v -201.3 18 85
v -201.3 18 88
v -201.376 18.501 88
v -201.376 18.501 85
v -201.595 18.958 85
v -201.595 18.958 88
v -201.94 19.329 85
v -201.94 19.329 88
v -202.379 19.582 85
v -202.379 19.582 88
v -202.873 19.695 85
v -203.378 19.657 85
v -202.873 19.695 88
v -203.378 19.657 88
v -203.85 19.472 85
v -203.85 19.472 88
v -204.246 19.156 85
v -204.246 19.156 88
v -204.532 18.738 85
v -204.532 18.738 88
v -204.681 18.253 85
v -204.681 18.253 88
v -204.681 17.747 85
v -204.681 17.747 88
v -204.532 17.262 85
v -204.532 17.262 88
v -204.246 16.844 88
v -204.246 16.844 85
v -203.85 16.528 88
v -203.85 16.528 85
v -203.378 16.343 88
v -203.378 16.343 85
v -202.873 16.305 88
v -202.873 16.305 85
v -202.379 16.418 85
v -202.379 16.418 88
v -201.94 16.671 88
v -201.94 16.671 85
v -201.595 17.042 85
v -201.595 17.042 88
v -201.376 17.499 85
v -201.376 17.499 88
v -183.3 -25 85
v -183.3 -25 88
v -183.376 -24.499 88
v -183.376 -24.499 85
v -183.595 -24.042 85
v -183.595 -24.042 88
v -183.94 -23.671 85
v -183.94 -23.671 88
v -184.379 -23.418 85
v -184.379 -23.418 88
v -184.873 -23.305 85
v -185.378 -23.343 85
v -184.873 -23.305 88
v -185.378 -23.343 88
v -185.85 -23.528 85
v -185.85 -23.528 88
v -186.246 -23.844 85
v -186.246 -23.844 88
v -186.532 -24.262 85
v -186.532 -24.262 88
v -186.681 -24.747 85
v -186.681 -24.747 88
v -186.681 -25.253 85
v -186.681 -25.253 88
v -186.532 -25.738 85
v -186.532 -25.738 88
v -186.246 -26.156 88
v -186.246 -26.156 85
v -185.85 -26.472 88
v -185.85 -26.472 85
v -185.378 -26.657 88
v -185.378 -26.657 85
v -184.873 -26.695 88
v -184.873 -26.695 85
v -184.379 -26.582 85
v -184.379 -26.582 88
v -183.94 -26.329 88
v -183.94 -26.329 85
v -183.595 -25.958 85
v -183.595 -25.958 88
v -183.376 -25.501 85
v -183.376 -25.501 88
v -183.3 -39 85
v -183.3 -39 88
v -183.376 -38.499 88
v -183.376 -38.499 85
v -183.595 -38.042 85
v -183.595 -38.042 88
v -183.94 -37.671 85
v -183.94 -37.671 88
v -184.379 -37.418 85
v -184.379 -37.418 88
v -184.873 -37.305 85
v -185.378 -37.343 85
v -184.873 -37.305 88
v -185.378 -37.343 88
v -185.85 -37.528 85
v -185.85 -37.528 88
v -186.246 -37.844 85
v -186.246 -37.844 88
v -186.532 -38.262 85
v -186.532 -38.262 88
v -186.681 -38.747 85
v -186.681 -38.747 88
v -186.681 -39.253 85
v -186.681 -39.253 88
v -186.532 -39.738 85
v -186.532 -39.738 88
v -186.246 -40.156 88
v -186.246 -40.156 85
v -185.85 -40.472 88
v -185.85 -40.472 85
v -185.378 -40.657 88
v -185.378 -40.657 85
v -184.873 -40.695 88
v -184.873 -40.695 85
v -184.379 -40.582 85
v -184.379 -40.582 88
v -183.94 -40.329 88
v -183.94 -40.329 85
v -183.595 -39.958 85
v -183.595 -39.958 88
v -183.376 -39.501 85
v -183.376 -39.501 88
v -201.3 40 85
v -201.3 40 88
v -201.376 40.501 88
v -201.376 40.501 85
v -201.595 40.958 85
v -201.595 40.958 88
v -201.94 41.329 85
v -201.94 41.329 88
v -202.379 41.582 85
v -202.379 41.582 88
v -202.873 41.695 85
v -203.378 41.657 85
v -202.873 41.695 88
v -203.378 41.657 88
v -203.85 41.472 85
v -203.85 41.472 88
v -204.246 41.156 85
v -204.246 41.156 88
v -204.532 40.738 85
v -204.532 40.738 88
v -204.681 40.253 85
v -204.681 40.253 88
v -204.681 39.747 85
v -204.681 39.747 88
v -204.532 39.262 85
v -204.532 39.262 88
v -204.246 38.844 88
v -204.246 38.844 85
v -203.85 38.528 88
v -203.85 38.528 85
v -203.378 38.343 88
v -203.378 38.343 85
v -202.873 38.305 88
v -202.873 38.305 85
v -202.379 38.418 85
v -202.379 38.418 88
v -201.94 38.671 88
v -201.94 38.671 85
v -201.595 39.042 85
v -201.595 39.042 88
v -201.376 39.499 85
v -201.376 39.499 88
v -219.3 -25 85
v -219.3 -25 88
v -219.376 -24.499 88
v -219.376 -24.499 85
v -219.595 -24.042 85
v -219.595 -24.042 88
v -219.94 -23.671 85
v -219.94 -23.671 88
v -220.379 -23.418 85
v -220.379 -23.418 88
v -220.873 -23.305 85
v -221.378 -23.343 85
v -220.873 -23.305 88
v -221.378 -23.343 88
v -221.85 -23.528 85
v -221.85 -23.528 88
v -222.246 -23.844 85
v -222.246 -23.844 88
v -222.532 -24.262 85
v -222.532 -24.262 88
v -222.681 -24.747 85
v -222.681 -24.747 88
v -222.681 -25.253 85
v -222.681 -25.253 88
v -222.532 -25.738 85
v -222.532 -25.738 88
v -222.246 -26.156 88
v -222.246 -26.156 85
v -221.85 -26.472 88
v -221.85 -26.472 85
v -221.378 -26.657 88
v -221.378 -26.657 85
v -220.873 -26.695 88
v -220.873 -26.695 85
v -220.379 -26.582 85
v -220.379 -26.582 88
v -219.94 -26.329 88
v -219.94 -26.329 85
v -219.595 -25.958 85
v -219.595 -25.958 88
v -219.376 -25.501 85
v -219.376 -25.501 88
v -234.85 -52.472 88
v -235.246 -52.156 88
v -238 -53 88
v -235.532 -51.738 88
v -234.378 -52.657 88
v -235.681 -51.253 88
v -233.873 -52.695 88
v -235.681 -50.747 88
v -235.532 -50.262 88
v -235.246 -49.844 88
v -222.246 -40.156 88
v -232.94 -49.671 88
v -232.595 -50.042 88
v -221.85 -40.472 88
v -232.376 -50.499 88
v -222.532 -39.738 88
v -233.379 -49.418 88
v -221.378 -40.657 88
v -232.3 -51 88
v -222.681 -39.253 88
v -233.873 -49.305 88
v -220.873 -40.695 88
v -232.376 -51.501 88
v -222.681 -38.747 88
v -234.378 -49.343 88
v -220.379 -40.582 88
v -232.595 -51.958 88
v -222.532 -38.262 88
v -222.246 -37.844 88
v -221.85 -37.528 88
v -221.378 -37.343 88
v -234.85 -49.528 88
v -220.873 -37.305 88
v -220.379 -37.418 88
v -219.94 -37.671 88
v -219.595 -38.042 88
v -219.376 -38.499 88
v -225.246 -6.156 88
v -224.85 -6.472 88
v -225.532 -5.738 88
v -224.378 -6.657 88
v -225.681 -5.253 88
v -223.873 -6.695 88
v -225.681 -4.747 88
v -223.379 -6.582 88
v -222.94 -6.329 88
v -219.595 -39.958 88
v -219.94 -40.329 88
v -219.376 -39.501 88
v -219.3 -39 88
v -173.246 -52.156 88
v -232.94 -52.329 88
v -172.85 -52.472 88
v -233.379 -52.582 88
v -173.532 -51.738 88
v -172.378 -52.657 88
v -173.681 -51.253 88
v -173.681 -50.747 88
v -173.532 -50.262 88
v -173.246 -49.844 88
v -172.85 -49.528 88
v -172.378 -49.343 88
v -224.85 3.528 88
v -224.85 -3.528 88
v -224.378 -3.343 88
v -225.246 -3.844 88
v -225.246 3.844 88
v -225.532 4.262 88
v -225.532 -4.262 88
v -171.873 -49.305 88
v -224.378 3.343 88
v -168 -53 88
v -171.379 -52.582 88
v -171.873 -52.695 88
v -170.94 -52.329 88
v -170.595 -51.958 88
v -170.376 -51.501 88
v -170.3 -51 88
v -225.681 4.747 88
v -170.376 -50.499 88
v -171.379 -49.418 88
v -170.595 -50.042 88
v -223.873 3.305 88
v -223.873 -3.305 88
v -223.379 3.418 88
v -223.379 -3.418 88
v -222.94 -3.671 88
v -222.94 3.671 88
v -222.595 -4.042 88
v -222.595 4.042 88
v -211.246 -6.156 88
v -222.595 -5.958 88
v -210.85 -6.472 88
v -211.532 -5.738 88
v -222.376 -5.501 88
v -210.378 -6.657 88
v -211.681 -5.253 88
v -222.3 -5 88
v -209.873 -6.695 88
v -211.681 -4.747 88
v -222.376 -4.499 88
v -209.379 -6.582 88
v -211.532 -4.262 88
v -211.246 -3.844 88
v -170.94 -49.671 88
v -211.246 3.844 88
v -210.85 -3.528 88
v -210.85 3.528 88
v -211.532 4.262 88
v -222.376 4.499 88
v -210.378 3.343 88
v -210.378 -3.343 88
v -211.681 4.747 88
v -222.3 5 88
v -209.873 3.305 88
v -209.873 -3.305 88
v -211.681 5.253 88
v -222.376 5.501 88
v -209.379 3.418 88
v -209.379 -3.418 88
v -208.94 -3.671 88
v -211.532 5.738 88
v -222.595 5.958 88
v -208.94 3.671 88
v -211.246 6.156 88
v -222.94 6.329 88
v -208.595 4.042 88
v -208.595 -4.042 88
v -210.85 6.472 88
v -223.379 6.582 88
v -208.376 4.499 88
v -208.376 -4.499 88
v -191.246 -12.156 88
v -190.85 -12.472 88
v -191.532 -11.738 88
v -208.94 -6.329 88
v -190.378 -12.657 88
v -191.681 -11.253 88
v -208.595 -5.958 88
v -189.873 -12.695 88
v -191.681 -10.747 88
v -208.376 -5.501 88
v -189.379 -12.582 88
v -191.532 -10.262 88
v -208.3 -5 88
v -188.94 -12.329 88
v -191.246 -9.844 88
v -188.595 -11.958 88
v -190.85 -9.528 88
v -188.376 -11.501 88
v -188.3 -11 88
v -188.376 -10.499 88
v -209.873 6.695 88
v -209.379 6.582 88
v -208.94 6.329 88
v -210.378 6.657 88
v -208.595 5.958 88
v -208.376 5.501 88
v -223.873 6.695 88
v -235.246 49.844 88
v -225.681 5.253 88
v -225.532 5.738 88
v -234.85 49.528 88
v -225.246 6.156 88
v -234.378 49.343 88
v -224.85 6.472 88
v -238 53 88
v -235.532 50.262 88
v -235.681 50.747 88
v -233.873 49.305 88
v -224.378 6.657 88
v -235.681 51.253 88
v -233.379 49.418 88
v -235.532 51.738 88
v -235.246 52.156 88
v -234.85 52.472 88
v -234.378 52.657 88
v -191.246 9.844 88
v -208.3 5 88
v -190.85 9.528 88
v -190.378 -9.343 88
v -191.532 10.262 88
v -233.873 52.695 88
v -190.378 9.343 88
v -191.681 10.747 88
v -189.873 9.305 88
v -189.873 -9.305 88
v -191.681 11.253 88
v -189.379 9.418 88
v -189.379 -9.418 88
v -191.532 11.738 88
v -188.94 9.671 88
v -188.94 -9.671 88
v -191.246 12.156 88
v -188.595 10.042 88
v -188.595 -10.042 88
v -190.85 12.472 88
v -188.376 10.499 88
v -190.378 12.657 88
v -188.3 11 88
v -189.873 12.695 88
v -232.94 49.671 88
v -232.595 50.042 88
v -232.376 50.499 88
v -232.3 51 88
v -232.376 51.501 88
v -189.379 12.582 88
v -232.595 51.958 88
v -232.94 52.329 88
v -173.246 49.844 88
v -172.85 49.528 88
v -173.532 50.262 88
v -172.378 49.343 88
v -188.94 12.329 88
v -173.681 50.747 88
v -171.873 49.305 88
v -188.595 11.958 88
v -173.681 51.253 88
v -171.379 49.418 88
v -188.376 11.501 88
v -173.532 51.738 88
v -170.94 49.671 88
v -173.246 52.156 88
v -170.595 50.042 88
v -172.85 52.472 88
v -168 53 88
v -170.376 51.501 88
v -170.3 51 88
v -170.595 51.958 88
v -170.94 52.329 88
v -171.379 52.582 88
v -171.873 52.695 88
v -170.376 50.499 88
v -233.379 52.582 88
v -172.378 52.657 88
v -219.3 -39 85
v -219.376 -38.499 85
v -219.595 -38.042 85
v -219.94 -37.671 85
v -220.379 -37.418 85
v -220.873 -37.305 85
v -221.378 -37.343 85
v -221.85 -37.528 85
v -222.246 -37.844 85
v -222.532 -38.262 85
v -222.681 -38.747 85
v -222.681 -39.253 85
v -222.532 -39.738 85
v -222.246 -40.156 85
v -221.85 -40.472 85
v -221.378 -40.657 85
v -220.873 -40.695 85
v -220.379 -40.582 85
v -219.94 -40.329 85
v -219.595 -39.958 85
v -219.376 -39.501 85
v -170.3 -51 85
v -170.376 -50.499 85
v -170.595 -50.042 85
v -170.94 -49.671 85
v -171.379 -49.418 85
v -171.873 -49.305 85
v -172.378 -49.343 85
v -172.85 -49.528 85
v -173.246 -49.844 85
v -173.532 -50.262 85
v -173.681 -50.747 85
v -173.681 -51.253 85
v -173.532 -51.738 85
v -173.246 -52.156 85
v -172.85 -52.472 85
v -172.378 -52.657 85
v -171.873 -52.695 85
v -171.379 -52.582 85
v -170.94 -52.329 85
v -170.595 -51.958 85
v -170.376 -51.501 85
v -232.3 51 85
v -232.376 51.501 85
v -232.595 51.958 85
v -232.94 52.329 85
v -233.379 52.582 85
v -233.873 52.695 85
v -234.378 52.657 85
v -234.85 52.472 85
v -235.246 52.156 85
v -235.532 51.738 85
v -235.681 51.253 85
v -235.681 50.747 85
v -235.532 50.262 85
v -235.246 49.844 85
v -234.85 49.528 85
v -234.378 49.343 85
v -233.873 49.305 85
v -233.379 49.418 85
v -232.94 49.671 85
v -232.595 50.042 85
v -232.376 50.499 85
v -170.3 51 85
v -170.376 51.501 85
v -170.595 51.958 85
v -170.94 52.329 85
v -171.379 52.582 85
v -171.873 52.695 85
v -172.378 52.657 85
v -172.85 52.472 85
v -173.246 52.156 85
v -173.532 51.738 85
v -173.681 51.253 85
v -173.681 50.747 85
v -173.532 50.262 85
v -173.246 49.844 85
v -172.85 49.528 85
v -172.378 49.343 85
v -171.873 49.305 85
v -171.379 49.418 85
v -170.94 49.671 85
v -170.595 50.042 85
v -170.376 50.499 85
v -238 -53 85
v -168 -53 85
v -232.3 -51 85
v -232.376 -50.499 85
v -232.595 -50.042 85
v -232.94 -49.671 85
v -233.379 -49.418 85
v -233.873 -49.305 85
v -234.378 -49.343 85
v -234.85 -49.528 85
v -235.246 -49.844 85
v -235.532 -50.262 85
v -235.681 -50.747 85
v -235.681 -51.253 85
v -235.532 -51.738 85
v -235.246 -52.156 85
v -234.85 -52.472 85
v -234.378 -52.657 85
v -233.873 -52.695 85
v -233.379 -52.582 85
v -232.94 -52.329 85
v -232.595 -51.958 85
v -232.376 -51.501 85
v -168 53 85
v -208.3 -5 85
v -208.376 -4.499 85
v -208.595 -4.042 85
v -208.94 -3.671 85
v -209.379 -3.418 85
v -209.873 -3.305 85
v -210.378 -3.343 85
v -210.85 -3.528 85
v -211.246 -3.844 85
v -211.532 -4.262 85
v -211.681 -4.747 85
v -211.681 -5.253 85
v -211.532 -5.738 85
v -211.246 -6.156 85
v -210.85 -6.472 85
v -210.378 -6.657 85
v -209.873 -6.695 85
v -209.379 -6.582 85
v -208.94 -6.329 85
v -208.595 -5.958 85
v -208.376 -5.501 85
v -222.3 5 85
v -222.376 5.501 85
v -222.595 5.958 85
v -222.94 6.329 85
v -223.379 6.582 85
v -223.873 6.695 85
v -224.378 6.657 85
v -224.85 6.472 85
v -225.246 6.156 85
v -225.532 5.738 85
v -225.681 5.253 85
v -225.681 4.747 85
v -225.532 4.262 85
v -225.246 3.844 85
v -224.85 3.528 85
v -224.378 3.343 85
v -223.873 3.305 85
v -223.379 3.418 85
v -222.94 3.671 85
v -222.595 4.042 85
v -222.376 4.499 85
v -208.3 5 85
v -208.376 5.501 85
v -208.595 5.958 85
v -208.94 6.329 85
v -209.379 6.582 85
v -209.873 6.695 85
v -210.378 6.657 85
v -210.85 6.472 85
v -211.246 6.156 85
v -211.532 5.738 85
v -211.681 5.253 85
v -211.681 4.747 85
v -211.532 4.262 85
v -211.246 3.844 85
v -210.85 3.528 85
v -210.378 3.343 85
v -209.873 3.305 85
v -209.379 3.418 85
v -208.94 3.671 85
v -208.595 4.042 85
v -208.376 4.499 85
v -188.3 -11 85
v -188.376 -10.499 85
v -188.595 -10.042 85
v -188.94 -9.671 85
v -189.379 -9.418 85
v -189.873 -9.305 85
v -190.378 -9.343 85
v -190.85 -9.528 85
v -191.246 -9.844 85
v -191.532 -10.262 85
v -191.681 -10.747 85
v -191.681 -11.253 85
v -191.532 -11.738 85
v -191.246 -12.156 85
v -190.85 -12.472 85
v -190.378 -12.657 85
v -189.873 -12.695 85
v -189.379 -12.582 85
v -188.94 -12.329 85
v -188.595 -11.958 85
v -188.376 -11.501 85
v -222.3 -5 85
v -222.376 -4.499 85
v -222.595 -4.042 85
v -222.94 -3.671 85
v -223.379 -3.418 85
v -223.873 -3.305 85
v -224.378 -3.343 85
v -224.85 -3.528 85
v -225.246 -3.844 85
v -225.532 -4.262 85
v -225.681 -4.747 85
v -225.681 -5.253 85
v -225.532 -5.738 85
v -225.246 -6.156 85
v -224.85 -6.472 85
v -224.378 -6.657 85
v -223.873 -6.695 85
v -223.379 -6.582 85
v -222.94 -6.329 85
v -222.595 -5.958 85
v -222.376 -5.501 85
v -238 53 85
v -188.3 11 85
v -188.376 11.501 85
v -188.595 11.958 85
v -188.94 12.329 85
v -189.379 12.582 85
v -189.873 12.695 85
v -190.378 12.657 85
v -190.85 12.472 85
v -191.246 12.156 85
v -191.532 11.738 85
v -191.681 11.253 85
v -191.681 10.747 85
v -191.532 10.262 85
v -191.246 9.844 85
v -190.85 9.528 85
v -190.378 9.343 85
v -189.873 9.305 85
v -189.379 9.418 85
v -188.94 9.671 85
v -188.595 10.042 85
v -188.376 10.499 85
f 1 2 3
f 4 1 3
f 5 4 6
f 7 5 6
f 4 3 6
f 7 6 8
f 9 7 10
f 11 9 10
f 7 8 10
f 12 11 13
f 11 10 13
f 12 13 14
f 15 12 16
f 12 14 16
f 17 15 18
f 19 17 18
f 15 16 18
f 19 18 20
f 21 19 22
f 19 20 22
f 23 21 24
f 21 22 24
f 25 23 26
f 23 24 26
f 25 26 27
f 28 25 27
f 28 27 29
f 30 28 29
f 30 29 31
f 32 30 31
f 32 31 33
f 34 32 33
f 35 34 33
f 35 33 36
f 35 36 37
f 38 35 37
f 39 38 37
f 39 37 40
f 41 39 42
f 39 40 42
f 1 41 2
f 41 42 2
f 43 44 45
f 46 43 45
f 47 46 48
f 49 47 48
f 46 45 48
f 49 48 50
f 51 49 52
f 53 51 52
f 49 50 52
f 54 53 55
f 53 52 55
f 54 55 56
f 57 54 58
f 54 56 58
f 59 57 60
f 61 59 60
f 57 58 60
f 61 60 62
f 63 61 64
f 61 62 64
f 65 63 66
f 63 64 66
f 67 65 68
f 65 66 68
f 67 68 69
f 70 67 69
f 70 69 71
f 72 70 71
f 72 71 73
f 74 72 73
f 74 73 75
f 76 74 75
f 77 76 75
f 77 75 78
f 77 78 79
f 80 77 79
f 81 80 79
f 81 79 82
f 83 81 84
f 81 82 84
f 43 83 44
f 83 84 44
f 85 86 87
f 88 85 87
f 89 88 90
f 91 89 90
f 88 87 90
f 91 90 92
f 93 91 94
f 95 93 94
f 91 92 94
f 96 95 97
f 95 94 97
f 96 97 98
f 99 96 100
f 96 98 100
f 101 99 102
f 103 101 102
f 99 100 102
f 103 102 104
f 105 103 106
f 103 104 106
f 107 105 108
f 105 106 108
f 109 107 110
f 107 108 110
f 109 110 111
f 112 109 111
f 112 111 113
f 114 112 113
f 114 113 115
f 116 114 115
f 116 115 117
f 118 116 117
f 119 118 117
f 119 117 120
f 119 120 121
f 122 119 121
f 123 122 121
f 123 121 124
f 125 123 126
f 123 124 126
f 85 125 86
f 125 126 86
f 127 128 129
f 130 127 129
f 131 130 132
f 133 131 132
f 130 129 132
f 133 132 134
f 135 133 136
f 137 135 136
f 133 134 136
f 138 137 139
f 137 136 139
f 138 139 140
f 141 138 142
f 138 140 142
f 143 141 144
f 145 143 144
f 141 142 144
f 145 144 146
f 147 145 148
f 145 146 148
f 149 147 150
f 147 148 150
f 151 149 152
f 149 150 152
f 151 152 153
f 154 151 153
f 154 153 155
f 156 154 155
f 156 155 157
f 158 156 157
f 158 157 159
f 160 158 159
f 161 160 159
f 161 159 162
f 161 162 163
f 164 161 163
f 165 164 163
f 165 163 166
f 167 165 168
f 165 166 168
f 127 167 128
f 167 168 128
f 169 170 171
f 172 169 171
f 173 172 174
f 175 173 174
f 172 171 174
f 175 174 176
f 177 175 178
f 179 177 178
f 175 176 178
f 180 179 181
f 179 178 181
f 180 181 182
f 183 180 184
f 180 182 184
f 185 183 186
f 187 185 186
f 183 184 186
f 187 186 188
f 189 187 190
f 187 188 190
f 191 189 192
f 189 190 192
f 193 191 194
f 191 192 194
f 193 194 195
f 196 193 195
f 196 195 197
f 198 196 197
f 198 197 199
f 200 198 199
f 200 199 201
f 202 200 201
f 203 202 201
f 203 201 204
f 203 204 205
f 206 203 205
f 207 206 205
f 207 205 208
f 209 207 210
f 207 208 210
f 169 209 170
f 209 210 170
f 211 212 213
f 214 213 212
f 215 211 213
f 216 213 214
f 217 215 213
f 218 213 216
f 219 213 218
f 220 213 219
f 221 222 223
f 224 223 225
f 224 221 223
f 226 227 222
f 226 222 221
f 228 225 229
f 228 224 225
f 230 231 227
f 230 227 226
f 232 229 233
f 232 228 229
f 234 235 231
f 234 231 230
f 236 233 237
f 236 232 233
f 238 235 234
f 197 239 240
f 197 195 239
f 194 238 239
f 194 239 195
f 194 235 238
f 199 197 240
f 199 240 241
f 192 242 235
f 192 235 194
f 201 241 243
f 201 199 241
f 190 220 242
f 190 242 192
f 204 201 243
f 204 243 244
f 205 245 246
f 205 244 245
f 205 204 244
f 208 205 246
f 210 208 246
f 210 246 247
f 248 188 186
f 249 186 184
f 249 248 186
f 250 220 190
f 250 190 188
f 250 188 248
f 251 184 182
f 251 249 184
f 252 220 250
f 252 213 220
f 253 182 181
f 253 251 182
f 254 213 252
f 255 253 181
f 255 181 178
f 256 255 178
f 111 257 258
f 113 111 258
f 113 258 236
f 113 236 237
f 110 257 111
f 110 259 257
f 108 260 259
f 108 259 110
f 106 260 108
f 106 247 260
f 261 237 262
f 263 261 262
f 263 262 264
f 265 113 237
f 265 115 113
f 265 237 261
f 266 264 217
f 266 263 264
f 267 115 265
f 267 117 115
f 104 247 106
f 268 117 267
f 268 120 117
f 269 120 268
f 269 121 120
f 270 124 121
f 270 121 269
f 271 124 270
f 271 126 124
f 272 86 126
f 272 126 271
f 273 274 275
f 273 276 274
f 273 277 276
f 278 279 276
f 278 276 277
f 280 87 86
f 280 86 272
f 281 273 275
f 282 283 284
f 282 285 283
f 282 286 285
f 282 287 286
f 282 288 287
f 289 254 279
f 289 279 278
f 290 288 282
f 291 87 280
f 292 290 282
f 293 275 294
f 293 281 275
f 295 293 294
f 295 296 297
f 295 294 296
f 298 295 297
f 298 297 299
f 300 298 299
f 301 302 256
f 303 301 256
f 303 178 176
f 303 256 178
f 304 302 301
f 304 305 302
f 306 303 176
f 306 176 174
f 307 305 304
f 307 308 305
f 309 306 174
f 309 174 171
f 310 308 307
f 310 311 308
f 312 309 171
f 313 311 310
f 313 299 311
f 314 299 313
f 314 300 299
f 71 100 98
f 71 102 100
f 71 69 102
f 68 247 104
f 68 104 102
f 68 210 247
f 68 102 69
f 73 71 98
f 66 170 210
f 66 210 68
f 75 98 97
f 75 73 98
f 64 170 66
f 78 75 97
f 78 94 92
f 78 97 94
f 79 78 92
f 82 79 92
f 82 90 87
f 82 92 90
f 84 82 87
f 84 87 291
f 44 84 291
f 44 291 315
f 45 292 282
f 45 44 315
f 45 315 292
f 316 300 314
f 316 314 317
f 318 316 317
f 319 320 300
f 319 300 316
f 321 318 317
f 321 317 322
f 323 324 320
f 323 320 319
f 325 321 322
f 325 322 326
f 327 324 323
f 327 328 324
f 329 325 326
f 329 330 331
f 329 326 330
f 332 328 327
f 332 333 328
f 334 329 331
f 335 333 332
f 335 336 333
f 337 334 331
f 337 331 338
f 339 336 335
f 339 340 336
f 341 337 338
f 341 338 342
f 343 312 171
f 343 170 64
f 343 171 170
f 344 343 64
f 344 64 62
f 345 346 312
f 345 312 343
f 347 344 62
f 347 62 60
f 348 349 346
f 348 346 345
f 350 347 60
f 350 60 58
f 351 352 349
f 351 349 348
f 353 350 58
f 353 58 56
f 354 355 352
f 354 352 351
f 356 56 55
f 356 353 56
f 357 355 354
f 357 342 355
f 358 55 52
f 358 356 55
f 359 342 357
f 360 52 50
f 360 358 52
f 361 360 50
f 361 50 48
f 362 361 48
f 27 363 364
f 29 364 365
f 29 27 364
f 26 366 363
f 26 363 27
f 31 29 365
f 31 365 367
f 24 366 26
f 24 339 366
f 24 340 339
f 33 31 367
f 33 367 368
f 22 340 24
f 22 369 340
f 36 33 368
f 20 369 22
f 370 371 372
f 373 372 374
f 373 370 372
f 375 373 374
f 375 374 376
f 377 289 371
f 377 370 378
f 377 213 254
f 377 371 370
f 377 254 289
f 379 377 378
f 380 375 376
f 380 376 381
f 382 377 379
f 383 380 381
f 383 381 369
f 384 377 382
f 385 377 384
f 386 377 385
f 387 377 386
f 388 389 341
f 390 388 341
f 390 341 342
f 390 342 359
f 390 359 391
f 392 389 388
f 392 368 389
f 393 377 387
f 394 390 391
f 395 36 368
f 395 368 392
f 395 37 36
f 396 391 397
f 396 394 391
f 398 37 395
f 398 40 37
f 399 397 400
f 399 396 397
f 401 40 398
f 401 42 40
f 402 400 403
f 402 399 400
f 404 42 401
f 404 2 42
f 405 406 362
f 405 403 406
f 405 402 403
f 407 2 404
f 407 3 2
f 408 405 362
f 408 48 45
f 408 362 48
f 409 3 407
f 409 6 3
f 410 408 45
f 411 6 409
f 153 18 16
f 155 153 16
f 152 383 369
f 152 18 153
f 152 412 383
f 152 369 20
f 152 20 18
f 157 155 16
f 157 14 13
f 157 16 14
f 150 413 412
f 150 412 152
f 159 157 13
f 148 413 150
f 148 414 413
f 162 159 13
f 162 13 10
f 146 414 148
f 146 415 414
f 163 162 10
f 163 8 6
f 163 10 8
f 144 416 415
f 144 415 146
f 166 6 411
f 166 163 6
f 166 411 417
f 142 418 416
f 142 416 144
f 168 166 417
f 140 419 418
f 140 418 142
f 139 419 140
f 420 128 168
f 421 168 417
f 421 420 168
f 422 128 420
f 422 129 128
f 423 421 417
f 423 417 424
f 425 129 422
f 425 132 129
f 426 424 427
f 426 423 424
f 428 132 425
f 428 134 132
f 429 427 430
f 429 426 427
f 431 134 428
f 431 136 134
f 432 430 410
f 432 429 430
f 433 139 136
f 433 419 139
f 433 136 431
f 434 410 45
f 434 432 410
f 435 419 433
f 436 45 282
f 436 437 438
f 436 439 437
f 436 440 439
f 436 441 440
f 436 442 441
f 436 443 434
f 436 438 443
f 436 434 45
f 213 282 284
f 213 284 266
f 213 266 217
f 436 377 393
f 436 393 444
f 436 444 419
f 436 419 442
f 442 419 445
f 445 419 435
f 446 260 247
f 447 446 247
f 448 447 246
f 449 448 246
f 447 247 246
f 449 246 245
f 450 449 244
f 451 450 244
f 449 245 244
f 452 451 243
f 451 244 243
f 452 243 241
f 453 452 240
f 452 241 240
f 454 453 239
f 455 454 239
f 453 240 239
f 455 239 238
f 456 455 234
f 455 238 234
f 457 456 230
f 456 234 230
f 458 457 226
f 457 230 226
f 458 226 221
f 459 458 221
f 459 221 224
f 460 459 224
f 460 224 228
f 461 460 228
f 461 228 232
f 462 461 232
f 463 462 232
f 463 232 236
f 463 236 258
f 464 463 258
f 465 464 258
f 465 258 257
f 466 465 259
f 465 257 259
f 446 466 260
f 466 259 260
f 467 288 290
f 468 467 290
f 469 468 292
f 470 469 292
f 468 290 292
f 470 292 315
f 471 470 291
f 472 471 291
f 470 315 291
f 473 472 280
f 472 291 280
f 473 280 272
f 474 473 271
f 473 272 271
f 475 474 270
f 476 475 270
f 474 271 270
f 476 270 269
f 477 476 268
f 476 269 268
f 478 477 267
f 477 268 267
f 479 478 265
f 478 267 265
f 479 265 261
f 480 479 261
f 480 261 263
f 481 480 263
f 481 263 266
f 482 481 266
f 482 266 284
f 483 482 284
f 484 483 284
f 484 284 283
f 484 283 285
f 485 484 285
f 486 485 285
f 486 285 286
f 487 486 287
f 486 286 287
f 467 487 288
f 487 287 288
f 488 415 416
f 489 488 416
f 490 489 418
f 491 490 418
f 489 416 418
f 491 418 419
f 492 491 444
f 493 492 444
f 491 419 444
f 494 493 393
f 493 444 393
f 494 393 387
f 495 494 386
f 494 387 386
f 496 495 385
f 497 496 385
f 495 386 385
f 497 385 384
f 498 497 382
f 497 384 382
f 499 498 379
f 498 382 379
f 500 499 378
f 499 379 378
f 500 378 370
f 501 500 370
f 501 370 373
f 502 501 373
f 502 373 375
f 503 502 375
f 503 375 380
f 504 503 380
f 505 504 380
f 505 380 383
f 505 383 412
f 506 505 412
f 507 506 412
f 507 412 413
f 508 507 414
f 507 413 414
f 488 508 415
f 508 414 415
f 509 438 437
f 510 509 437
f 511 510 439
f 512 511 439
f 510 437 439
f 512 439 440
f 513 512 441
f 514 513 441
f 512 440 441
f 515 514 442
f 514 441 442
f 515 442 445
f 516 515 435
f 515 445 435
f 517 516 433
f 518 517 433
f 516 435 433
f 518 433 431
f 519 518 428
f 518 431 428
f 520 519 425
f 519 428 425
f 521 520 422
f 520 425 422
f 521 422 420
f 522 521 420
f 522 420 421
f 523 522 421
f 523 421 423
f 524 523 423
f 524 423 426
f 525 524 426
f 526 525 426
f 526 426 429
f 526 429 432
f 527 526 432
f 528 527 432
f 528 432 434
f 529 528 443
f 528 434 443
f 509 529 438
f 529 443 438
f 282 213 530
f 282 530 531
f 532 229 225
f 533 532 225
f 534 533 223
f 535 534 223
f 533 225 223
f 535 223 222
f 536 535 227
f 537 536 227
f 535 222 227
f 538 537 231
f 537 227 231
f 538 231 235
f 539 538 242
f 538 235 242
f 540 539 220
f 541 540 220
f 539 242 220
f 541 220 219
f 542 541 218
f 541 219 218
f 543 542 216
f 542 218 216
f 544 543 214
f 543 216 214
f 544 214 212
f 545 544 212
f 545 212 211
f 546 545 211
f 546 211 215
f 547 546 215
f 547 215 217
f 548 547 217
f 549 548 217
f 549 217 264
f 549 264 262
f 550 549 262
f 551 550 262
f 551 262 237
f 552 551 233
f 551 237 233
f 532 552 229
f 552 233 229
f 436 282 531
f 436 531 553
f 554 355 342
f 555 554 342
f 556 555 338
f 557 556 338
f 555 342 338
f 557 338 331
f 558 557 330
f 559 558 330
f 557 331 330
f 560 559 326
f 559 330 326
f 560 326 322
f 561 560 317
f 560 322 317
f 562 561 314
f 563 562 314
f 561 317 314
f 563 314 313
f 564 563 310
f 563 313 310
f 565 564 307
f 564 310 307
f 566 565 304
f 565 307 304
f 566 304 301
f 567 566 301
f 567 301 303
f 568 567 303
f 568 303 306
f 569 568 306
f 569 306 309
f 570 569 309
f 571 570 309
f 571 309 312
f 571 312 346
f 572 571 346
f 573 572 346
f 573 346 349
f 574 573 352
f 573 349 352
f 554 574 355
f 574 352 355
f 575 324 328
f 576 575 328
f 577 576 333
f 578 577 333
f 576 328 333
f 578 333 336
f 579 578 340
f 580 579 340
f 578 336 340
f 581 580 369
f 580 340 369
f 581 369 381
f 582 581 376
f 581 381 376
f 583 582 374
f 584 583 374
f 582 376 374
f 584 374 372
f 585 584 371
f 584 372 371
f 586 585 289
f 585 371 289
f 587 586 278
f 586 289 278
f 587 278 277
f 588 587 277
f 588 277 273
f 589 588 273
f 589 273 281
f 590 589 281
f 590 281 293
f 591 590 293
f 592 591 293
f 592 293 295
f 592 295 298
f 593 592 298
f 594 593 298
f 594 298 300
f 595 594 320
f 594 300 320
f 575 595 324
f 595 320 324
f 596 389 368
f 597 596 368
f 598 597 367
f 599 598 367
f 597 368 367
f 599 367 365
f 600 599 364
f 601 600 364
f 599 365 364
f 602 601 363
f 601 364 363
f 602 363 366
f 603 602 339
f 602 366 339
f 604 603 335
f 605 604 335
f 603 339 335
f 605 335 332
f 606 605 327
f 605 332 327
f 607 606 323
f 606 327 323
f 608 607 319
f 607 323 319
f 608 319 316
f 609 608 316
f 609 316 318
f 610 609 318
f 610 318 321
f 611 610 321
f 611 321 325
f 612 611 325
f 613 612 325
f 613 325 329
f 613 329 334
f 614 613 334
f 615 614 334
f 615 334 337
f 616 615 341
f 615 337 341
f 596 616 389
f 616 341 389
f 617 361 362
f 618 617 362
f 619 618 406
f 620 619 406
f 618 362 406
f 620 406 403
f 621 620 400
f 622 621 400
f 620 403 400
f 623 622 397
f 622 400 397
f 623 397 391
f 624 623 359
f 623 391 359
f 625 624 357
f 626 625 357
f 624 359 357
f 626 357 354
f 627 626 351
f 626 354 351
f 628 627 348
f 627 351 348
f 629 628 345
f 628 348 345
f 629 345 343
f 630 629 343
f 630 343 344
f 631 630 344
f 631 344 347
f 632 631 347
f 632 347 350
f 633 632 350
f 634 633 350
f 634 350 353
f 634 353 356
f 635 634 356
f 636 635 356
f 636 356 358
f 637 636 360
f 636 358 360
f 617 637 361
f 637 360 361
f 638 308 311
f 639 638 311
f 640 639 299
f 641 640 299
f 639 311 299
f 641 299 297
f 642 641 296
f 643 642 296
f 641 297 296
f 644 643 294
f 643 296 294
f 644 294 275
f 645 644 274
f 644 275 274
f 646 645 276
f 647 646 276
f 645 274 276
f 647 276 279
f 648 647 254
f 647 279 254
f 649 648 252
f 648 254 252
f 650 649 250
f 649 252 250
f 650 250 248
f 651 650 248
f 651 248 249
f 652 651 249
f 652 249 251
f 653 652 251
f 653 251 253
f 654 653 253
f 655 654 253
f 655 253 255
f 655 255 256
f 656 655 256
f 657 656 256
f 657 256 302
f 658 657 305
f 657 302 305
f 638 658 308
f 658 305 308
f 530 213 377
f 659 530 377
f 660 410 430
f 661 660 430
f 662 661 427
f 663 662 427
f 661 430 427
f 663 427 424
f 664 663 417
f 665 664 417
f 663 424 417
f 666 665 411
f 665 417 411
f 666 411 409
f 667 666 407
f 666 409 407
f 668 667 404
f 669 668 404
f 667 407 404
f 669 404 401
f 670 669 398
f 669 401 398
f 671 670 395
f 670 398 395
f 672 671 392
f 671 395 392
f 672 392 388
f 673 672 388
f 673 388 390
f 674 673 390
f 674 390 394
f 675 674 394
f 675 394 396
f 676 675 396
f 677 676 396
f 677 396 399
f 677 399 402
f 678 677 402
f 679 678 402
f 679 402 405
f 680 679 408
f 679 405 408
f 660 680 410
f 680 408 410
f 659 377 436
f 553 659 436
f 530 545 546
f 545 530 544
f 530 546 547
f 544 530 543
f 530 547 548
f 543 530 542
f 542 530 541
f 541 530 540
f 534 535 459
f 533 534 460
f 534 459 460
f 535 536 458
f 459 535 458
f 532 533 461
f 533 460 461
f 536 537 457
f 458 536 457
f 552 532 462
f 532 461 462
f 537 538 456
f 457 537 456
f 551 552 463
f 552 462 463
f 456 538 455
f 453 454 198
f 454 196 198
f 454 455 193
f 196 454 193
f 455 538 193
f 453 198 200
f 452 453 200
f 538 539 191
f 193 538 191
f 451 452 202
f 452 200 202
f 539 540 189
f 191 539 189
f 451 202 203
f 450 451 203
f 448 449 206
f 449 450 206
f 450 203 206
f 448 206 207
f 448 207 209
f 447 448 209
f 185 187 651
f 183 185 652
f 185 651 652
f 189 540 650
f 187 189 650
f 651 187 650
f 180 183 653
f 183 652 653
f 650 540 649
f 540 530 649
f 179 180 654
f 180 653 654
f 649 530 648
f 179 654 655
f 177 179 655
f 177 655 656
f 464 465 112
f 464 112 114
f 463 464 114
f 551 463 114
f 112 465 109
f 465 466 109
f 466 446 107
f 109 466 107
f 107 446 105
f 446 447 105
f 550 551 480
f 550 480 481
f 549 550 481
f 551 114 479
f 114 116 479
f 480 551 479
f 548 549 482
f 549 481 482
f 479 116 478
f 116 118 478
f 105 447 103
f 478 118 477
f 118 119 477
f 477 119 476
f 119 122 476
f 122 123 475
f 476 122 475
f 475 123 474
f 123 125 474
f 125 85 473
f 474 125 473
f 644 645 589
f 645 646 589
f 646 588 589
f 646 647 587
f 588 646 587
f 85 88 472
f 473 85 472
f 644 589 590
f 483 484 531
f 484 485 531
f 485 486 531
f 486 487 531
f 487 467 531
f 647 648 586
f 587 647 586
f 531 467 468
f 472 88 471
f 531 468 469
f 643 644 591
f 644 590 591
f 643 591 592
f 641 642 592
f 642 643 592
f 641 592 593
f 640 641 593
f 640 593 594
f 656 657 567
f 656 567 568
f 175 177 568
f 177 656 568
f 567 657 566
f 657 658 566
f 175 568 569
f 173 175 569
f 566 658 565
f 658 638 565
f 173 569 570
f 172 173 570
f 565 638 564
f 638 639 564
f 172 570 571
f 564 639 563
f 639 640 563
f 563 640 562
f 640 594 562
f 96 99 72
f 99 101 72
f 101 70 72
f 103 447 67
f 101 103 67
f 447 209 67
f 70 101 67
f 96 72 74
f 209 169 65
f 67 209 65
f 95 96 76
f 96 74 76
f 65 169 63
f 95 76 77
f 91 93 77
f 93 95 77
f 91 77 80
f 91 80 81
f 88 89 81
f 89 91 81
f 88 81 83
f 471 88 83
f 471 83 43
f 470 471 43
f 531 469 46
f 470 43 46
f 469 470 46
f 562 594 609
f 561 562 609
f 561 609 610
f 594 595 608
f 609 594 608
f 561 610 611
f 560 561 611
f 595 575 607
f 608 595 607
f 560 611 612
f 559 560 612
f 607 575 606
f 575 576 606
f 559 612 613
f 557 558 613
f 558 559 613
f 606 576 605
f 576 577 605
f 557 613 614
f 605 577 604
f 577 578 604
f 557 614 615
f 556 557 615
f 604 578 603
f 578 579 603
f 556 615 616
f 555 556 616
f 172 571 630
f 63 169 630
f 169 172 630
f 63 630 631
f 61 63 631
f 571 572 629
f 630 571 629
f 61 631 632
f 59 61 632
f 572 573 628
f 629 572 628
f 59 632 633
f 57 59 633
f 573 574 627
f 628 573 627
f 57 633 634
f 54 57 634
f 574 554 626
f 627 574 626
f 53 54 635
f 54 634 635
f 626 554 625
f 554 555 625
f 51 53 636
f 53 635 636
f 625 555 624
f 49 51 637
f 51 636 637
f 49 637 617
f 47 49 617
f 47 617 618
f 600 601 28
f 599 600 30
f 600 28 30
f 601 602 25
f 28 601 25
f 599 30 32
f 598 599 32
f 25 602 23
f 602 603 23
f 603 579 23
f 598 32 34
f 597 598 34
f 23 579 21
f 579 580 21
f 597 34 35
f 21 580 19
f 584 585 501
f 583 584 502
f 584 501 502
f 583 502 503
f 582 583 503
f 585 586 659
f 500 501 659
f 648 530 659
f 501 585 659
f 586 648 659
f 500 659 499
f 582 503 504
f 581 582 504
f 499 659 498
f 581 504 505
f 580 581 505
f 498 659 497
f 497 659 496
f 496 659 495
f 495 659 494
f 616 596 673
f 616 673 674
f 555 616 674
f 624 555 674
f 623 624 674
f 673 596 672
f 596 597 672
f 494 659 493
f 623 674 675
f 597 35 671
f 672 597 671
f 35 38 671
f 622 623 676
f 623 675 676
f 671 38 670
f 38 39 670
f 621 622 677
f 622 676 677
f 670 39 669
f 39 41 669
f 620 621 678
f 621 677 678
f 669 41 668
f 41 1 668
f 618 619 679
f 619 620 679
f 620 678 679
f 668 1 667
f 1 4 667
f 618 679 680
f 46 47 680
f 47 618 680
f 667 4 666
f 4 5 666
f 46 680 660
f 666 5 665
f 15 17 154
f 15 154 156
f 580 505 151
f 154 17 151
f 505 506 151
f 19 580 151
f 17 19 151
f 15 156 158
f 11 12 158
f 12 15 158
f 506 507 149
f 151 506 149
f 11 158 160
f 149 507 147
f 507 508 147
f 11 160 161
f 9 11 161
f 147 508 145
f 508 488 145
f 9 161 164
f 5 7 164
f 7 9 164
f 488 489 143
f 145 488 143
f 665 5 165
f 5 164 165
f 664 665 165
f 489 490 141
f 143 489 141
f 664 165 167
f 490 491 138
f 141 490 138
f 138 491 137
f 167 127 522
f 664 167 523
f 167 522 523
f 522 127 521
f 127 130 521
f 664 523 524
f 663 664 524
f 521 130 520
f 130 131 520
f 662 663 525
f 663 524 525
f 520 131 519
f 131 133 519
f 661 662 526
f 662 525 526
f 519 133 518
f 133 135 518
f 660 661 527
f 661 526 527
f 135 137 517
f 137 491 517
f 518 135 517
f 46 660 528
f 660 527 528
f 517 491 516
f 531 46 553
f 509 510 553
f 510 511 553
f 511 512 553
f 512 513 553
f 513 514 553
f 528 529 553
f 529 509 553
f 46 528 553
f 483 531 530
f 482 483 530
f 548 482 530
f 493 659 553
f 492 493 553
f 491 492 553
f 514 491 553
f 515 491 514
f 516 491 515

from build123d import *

# Parameters (mm, degrees)
MAIN_PROFILE_SKETCH_W = 70
MAIN_PROFILE_SKETCH_H = 106
MAIN_PROFILE_SKETCH_R = 1.7
MAIN_EXTRUSION_DEPTH  = 3


with BuildPart() as part:
    # Main Profile Sketch → Main Extrusion (new body)
    with BuildSketch(Plane.XY.offset(88)):
        with Locations((-203, 0)):
            Rectangle(MAIN_PROFILE_SKETCH_W, MAIN_PROFILE_SKETCH_H)
        with Locations((-234, -51)):
            Circle(MAIN_PROFILE_SKETCH_R, mode=Mode.SUBTRACT)
        with Locations((-221, -39)):
            Circle(MAIN_PROFILE_SKETCH_R, mode=Mode.SUBTRACT)
        with Locations((-221, -25)):
            Circle(MAIN_PROFILE_SKETCH_R, mode=Mode.SUBTRACT)
        with Locations((-224, -5)):
            Circle(MAIN_PROFILE_SKETCH_R, mode=Mode.SUBTRACT)
        with Locations((-210, -5)):
            Circle(MAIN_PROFILE_SKETCH_R, mode=Mode.SUBTRACT)
        with Locations((-172, -51)):
            Circle(MAIN_PROFILE_SKETCH_R, mode=Mode.SUBTRACT)
        with Locations((-185, -39)):
            Circle(MAIN_PROFILE_SKETCH_R, mode=Mode.SUBTRACT)
        with Locations((-190, -11)):
            Circle(MAIN_PROFILE_SKETCH_R, mode=Mode.SUBTRACT)
        with Locations((-185, -25)):
            Circle(MAIN_PROFILE_SKETCH_R, mode=Mode.SUBTRACT)
        with Locations((-224, 5)):
            Circle(MAIN_PROFILE_SKETCH_R, mode=Mode.SUBTRACT)
        with Locations((-210, 5)):
            Circle(MAIN_PROFILE_SKETCH_R, mode=Mode.SUBTRACT)
        with Locations((-234, 51)):
            Circle(MAIN_PROFILE_SKETCH_R, mode=Mode.SUBTRACT)
        with Locations((-190, 11)):
            Circle(MAIN_PROFILE_SKETCH_R, mode=Mode.SUBTRACT)
        with Locations((-203, 18)):
            Circle(MAIN_PROFILE_SKETCH_R, mode=Mode.SUBTRACT)
        with Locations((-203, 40)):
            Circle(MAIN_PROFILE_SKETCH_R, mode=Mode.SUBTRACT)
        with Locations((-172, 51)):
            Circle(MAIN_PROFILE_SKETCH_R, mode=Mode.SUBTRACT)
    extrude(amount=-MAIN_EXTRUSION_DEPTH)


solid = part.part
